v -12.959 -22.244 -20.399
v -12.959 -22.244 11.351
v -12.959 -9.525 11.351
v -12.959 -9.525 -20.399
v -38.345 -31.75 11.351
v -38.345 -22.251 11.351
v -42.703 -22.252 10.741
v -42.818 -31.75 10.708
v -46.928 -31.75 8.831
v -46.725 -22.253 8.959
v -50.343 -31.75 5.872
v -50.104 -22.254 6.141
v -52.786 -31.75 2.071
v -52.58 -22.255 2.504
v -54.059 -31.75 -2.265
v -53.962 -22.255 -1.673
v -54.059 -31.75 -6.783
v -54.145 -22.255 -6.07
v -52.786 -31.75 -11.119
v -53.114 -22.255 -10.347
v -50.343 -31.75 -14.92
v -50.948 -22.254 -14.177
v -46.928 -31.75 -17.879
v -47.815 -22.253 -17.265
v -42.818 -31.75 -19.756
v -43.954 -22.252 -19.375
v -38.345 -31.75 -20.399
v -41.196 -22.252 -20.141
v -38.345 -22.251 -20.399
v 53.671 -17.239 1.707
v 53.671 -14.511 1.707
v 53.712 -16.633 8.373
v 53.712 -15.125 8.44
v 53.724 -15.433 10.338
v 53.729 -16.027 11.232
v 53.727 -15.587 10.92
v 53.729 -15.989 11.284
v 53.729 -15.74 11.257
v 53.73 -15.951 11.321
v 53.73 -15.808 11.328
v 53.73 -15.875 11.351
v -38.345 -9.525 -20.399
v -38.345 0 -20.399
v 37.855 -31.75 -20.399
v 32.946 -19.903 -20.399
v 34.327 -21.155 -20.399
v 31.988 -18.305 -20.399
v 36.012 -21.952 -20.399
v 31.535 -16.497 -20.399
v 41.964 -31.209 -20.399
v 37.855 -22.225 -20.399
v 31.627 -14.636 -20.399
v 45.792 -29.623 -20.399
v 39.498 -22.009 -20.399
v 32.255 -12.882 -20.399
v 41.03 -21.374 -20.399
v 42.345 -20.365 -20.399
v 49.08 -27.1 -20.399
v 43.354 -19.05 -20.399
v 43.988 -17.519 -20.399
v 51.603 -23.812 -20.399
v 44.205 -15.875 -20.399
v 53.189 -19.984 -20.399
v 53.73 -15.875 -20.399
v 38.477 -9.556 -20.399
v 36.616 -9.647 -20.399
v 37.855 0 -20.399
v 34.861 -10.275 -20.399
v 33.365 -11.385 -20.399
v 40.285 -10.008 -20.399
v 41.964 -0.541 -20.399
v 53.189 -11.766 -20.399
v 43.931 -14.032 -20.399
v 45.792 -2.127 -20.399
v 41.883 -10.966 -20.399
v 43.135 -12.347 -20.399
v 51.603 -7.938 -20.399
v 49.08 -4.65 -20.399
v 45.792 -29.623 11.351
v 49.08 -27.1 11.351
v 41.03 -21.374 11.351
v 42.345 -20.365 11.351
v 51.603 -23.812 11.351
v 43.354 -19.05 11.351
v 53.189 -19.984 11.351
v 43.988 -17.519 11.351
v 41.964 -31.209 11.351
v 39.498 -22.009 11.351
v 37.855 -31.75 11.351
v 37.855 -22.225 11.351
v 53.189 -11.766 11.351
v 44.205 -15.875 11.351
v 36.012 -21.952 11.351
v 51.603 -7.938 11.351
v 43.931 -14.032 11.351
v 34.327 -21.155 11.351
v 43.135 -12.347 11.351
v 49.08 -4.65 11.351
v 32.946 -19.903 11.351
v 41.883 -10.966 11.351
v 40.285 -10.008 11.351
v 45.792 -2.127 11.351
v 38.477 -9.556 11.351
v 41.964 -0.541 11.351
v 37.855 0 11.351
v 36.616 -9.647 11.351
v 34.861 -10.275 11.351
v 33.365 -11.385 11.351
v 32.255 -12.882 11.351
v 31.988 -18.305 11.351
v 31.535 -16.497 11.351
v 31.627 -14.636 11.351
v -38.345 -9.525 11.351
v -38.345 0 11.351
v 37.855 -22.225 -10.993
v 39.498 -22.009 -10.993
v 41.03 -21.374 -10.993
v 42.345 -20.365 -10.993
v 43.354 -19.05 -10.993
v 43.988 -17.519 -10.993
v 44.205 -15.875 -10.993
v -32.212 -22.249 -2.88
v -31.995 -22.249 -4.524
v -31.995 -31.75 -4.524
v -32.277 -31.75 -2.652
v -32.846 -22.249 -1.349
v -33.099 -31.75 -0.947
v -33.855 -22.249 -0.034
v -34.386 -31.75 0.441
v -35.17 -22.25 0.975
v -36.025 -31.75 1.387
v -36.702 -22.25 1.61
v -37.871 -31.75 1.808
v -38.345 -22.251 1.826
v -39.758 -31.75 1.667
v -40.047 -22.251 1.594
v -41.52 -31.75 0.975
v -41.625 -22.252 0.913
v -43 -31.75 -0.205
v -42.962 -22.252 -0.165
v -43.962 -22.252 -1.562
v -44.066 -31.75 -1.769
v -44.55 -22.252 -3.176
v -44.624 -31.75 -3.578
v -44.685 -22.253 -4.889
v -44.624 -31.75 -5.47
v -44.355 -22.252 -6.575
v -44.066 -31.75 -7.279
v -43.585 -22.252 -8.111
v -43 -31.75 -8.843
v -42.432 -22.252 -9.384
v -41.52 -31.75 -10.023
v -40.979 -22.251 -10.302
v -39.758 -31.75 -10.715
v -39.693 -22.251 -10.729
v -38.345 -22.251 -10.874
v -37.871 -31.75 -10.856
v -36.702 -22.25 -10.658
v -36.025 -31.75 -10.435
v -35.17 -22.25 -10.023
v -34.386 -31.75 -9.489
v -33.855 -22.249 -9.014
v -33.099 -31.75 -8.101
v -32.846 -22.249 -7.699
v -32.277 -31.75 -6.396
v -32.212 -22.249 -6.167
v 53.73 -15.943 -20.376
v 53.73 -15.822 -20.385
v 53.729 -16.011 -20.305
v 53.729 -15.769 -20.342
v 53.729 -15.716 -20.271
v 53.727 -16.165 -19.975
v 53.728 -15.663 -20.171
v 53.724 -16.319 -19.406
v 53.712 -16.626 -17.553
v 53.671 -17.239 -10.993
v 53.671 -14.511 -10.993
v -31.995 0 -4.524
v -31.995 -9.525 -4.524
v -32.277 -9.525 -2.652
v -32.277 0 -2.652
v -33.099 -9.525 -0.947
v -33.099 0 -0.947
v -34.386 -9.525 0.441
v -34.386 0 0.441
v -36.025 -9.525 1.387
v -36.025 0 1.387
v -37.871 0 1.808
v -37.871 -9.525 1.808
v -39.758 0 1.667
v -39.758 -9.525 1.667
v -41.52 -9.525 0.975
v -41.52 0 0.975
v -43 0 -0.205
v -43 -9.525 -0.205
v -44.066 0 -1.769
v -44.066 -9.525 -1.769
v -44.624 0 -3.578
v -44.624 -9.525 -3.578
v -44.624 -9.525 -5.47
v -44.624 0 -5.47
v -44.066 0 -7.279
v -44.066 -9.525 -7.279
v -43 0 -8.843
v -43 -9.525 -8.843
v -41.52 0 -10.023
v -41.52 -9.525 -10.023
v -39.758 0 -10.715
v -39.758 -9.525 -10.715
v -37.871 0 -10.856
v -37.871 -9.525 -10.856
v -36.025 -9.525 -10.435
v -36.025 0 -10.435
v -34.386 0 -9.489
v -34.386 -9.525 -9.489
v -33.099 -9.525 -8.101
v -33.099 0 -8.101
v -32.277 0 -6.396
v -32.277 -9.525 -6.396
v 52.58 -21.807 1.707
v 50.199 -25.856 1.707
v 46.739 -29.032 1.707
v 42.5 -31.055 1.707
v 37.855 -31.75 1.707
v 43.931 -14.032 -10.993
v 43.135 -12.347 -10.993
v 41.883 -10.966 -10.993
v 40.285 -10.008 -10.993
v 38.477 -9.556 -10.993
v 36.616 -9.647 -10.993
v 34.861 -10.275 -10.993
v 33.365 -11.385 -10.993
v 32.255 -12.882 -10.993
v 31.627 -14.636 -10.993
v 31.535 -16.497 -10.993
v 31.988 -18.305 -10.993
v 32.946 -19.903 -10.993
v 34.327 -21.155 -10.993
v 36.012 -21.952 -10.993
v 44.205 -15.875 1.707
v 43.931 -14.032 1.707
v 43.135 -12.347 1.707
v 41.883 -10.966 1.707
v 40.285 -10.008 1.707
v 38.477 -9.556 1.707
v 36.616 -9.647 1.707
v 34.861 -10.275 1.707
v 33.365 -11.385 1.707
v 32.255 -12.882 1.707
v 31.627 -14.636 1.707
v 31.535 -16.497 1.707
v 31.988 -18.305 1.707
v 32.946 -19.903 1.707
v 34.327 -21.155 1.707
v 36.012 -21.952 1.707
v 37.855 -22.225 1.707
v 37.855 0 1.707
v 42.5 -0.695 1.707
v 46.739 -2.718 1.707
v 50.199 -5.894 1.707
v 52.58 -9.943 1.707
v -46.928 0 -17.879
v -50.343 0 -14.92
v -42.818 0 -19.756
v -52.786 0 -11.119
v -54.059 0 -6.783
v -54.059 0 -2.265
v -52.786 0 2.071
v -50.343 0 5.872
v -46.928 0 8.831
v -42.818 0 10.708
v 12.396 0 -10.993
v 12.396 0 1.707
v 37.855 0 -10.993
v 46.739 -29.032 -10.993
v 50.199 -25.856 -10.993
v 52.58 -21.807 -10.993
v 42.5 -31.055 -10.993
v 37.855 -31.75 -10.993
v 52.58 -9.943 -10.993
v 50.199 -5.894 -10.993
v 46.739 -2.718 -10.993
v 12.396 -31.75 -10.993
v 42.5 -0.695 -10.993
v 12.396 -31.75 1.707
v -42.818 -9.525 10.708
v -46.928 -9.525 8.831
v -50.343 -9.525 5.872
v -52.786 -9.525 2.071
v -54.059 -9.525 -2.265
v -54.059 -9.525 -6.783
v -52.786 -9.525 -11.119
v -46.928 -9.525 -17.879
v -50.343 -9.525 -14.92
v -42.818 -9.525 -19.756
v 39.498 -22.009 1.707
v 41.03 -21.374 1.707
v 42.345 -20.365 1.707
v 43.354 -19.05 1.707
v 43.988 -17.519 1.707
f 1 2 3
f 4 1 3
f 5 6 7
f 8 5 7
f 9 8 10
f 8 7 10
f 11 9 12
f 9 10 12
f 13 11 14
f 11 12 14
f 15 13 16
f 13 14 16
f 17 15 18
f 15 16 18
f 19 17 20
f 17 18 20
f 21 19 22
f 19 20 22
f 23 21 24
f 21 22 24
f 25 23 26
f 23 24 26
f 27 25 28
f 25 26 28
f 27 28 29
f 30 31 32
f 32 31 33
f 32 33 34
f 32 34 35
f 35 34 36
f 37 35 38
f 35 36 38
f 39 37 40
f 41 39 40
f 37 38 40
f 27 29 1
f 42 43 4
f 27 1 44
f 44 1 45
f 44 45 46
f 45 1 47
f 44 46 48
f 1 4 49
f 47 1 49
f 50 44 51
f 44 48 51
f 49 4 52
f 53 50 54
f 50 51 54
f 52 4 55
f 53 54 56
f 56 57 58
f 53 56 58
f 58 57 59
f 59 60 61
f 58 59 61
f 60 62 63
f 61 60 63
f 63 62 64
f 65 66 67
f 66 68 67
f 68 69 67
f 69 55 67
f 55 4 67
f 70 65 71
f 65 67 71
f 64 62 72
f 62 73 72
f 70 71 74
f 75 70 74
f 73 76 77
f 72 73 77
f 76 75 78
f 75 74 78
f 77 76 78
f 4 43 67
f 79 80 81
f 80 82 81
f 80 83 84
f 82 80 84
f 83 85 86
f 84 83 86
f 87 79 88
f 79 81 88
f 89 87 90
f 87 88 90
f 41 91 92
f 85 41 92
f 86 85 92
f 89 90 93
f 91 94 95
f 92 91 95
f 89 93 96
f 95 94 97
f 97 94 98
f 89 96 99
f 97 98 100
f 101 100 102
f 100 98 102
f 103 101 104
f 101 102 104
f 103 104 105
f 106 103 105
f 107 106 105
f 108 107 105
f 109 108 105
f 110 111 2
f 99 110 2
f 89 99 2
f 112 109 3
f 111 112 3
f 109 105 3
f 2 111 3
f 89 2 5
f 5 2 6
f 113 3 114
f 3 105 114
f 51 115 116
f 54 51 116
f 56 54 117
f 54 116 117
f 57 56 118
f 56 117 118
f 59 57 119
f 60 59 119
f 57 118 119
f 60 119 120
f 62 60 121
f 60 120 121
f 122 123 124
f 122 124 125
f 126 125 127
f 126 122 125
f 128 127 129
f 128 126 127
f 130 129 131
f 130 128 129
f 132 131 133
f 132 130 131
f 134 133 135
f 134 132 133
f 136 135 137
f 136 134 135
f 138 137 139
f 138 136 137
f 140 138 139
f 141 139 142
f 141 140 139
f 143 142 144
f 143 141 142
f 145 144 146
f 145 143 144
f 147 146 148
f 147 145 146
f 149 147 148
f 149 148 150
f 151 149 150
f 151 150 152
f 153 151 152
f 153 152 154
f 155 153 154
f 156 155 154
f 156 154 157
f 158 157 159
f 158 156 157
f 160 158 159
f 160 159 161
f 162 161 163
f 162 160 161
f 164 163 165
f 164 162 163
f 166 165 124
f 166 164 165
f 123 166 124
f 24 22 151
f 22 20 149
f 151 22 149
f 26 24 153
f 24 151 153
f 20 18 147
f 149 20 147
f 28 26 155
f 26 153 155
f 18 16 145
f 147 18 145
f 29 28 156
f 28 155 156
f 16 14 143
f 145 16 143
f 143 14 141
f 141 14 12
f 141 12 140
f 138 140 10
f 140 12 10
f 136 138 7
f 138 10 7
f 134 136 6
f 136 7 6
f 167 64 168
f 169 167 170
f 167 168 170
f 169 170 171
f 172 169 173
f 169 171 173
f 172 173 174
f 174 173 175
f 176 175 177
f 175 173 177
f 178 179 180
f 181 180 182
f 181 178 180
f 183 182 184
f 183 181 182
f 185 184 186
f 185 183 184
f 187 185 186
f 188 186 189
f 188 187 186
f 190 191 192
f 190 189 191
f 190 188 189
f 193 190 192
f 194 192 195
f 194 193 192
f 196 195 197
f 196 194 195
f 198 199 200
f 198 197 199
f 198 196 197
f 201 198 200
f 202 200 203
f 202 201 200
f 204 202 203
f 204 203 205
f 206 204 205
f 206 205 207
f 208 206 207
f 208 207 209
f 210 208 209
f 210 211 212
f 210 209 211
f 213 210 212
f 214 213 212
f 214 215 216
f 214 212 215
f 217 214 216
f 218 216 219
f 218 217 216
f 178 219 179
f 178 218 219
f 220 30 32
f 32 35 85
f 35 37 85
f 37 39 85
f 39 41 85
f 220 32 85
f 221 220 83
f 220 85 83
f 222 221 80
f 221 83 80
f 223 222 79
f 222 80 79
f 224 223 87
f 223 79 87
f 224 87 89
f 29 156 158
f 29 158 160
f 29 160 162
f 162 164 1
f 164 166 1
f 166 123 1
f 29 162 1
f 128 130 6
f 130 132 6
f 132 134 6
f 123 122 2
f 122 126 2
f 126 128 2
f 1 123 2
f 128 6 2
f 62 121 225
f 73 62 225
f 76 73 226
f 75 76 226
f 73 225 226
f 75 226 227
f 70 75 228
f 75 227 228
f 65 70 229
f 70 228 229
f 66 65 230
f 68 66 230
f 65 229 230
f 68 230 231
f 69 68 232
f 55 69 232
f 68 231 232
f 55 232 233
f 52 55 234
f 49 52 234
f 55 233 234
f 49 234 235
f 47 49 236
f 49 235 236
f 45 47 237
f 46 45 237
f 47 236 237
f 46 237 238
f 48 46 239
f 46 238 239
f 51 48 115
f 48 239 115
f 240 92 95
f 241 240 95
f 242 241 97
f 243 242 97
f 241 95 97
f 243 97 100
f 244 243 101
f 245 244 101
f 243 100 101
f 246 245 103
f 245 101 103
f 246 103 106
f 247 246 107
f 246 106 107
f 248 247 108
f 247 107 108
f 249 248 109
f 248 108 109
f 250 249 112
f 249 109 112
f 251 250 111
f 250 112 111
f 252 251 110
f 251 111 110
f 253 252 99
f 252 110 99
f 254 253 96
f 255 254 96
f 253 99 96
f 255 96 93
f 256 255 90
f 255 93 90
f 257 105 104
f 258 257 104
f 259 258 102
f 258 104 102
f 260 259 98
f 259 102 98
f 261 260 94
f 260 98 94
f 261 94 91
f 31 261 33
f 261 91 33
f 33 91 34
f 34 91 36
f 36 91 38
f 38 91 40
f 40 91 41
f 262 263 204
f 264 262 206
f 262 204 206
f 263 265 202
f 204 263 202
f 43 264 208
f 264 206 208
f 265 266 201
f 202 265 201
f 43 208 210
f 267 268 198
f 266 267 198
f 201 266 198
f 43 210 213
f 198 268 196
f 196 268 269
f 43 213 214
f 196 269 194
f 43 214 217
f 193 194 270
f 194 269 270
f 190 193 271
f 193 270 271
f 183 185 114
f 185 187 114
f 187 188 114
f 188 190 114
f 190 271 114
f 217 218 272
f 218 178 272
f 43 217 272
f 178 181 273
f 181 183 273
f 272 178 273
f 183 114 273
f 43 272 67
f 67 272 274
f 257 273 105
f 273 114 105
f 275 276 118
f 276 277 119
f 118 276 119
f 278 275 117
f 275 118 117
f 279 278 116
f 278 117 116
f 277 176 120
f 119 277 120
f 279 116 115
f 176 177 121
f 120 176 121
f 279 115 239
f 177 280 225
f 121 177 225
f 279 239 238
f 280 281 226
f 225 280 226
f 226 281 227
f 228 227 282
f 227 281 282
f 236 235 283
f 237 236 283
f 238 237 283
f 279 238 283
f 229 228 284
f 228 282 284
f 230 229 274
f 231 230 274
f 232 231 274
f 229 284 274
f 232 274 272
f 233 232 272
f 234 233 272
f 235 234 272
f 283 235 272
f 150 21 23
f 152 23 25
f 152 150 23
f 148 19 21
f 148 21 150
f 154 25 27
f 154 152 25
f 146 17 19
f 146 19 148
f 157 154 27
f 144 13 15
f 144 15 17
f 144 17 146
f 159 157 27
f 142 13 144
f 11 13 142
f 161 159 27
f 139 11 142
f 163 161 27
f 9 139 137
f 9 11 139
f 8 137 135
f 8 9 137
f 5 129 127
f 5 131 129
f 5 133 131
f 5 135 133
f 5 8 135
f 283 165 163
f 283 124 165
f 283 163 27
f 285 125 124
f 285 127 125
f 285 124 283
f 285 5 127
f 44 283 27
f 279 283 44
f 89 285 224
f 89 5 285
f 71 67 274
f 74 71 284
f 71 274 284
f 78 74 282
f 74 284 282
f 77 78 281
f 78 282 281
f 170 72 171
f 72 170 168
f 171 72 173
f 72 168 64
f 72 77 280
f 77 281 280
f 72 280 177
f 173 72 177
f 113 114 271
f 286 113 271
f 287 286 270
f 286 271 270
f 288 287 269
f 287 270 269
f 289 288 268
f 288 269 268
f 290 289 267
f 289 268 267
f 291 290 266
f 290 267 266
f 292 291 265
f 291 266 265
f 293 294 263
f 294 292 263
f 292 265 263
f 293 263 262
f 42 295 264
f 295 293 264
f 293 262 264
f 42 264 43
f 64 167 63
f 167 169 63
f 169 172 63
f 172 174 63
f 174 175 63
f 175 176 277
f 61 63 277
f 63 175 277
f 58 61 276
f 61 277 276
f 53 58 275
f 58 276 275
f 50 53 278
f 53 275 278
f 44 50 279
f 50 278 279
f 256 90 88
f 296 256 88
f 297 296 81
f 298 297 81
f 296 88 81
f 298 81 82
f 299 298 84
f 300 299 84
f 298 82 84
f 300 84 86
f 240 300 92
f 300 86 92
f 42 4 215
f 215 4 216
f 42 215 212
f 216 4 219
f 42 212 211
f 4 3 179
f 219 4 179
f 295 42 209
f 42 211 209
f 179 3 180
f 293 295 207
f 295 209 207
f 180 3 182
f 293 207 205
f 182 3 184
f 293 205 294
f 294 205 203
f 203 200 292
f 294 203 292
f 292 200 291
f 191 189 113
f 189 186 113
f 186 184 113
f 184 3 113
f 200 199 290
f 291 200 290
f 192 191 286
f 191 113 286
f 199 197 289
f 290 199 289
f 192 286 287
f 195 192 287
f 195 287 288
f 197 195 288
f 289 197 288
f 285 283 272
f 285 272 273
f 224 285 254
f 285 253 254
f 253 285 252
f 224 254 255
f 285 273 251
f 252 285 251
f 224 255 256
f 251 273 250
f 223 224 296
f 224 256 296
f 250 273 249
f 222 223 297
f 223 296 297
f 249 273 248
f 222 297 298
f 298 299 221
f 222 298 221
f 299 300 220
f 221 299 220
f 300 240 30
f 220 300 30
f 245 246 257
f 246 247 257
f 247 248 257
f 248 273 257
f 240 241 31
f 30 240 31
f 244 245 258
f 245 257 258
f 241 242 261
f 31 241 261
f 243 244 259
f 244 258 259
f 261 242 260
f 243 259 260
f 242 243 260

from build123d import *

# Parameters (mm, degrees)
F0_R     = 6.35
F1_DEPTH = 31.75
F3_DEPTH = 31.751


with BuildPart() as f1:
    # F0 (on Front) → F1 (new body)
    with BuildSketch(Plane.XZ):
        with BuildLine():
            Line((53.7298298755, 11.3510093242), (-38.3451701245, 11.3510093242))
            ThreePointArc((-38.3451701245, 11.3510093242), (-54.2201701245, -4.5239906758), (-38.3451701245, -20.3989906758))
            Line((-38.3451701245, -20.3989906758), (53.7298298755, -20.3989906758))
            Line((53.7298298755, -20.3989906758), (53.6711269855, -10.9930955659))
            Line((53.6711269855, -10.9930955659), (12.3961269855, -10.9930955659))
            Line((12.3961269855, -10.9930955659), (12.3961269855, 1.7069044341))
            Line((12.3961269855, 1.7069044341), (53.6711269855, 1.7069044341))
            Line((53.6711269855, 1.7069044341), (53.7298298755, 11.3510093242))
        make_face()
        with Locations((-38.3451701245, -4.5239906758)):
            Circle(F0_R, mode=Mode.SUBTRACT)
    extrude(amount=F1_DEPTH)

    # F2 (on face) → F3 (cut, through all)
    with BuildSketch(Plane.XY.offset(11.3510093242)):
        with BuildLine():
            Line((53.7298298755, 0), (37.8548298755, 0))
            ThreePointArc((37.8548298755, 0), (49.0801500268, -4.6496798487), (53.7298298755, -15.875))
            Line((53.7298298755, -15.875), (53.7298298755, 0))
        make_face()
        with BuildLine():
            Line((53.7298298755, -31.75), (53.7298298755, -15.875))
            ThreePointArc((53.7298298755, -15.875), (49.0801500268, -27.1003201513), (37.8548298755, -31.75))
            Line((37.8548298755, -31.75), (53.7298298755, -31.75))
        make_face()
        Polygon((-38.3451701245, -22.2507314071), (-38.3451701245, -9.525), (-54.2339347303, -9.525), (-54.2339347303, -22.2551717675), align=None)
        Polygon((-12.9589347303, -9.525), (-38.3451701245, -9.525), (-38.3451701245, -22.2507314071), (-12.9589347303, -22.243636832), align=None)
        with BuildLine():
            ThreePointArc((37.8548298755, -22.225), (42.344957936, -20.3651280605), (44.2048298755, -15.875))
            ThreePointArc((44.2048298755, -15.875), (33.3647018149, -11.3848719395), (37.8548298755, -22.225))
        make_face()
    extrude(amount=-F3_DEPTH, mode=Mode.SUBTRACT)


solid = f1.part
